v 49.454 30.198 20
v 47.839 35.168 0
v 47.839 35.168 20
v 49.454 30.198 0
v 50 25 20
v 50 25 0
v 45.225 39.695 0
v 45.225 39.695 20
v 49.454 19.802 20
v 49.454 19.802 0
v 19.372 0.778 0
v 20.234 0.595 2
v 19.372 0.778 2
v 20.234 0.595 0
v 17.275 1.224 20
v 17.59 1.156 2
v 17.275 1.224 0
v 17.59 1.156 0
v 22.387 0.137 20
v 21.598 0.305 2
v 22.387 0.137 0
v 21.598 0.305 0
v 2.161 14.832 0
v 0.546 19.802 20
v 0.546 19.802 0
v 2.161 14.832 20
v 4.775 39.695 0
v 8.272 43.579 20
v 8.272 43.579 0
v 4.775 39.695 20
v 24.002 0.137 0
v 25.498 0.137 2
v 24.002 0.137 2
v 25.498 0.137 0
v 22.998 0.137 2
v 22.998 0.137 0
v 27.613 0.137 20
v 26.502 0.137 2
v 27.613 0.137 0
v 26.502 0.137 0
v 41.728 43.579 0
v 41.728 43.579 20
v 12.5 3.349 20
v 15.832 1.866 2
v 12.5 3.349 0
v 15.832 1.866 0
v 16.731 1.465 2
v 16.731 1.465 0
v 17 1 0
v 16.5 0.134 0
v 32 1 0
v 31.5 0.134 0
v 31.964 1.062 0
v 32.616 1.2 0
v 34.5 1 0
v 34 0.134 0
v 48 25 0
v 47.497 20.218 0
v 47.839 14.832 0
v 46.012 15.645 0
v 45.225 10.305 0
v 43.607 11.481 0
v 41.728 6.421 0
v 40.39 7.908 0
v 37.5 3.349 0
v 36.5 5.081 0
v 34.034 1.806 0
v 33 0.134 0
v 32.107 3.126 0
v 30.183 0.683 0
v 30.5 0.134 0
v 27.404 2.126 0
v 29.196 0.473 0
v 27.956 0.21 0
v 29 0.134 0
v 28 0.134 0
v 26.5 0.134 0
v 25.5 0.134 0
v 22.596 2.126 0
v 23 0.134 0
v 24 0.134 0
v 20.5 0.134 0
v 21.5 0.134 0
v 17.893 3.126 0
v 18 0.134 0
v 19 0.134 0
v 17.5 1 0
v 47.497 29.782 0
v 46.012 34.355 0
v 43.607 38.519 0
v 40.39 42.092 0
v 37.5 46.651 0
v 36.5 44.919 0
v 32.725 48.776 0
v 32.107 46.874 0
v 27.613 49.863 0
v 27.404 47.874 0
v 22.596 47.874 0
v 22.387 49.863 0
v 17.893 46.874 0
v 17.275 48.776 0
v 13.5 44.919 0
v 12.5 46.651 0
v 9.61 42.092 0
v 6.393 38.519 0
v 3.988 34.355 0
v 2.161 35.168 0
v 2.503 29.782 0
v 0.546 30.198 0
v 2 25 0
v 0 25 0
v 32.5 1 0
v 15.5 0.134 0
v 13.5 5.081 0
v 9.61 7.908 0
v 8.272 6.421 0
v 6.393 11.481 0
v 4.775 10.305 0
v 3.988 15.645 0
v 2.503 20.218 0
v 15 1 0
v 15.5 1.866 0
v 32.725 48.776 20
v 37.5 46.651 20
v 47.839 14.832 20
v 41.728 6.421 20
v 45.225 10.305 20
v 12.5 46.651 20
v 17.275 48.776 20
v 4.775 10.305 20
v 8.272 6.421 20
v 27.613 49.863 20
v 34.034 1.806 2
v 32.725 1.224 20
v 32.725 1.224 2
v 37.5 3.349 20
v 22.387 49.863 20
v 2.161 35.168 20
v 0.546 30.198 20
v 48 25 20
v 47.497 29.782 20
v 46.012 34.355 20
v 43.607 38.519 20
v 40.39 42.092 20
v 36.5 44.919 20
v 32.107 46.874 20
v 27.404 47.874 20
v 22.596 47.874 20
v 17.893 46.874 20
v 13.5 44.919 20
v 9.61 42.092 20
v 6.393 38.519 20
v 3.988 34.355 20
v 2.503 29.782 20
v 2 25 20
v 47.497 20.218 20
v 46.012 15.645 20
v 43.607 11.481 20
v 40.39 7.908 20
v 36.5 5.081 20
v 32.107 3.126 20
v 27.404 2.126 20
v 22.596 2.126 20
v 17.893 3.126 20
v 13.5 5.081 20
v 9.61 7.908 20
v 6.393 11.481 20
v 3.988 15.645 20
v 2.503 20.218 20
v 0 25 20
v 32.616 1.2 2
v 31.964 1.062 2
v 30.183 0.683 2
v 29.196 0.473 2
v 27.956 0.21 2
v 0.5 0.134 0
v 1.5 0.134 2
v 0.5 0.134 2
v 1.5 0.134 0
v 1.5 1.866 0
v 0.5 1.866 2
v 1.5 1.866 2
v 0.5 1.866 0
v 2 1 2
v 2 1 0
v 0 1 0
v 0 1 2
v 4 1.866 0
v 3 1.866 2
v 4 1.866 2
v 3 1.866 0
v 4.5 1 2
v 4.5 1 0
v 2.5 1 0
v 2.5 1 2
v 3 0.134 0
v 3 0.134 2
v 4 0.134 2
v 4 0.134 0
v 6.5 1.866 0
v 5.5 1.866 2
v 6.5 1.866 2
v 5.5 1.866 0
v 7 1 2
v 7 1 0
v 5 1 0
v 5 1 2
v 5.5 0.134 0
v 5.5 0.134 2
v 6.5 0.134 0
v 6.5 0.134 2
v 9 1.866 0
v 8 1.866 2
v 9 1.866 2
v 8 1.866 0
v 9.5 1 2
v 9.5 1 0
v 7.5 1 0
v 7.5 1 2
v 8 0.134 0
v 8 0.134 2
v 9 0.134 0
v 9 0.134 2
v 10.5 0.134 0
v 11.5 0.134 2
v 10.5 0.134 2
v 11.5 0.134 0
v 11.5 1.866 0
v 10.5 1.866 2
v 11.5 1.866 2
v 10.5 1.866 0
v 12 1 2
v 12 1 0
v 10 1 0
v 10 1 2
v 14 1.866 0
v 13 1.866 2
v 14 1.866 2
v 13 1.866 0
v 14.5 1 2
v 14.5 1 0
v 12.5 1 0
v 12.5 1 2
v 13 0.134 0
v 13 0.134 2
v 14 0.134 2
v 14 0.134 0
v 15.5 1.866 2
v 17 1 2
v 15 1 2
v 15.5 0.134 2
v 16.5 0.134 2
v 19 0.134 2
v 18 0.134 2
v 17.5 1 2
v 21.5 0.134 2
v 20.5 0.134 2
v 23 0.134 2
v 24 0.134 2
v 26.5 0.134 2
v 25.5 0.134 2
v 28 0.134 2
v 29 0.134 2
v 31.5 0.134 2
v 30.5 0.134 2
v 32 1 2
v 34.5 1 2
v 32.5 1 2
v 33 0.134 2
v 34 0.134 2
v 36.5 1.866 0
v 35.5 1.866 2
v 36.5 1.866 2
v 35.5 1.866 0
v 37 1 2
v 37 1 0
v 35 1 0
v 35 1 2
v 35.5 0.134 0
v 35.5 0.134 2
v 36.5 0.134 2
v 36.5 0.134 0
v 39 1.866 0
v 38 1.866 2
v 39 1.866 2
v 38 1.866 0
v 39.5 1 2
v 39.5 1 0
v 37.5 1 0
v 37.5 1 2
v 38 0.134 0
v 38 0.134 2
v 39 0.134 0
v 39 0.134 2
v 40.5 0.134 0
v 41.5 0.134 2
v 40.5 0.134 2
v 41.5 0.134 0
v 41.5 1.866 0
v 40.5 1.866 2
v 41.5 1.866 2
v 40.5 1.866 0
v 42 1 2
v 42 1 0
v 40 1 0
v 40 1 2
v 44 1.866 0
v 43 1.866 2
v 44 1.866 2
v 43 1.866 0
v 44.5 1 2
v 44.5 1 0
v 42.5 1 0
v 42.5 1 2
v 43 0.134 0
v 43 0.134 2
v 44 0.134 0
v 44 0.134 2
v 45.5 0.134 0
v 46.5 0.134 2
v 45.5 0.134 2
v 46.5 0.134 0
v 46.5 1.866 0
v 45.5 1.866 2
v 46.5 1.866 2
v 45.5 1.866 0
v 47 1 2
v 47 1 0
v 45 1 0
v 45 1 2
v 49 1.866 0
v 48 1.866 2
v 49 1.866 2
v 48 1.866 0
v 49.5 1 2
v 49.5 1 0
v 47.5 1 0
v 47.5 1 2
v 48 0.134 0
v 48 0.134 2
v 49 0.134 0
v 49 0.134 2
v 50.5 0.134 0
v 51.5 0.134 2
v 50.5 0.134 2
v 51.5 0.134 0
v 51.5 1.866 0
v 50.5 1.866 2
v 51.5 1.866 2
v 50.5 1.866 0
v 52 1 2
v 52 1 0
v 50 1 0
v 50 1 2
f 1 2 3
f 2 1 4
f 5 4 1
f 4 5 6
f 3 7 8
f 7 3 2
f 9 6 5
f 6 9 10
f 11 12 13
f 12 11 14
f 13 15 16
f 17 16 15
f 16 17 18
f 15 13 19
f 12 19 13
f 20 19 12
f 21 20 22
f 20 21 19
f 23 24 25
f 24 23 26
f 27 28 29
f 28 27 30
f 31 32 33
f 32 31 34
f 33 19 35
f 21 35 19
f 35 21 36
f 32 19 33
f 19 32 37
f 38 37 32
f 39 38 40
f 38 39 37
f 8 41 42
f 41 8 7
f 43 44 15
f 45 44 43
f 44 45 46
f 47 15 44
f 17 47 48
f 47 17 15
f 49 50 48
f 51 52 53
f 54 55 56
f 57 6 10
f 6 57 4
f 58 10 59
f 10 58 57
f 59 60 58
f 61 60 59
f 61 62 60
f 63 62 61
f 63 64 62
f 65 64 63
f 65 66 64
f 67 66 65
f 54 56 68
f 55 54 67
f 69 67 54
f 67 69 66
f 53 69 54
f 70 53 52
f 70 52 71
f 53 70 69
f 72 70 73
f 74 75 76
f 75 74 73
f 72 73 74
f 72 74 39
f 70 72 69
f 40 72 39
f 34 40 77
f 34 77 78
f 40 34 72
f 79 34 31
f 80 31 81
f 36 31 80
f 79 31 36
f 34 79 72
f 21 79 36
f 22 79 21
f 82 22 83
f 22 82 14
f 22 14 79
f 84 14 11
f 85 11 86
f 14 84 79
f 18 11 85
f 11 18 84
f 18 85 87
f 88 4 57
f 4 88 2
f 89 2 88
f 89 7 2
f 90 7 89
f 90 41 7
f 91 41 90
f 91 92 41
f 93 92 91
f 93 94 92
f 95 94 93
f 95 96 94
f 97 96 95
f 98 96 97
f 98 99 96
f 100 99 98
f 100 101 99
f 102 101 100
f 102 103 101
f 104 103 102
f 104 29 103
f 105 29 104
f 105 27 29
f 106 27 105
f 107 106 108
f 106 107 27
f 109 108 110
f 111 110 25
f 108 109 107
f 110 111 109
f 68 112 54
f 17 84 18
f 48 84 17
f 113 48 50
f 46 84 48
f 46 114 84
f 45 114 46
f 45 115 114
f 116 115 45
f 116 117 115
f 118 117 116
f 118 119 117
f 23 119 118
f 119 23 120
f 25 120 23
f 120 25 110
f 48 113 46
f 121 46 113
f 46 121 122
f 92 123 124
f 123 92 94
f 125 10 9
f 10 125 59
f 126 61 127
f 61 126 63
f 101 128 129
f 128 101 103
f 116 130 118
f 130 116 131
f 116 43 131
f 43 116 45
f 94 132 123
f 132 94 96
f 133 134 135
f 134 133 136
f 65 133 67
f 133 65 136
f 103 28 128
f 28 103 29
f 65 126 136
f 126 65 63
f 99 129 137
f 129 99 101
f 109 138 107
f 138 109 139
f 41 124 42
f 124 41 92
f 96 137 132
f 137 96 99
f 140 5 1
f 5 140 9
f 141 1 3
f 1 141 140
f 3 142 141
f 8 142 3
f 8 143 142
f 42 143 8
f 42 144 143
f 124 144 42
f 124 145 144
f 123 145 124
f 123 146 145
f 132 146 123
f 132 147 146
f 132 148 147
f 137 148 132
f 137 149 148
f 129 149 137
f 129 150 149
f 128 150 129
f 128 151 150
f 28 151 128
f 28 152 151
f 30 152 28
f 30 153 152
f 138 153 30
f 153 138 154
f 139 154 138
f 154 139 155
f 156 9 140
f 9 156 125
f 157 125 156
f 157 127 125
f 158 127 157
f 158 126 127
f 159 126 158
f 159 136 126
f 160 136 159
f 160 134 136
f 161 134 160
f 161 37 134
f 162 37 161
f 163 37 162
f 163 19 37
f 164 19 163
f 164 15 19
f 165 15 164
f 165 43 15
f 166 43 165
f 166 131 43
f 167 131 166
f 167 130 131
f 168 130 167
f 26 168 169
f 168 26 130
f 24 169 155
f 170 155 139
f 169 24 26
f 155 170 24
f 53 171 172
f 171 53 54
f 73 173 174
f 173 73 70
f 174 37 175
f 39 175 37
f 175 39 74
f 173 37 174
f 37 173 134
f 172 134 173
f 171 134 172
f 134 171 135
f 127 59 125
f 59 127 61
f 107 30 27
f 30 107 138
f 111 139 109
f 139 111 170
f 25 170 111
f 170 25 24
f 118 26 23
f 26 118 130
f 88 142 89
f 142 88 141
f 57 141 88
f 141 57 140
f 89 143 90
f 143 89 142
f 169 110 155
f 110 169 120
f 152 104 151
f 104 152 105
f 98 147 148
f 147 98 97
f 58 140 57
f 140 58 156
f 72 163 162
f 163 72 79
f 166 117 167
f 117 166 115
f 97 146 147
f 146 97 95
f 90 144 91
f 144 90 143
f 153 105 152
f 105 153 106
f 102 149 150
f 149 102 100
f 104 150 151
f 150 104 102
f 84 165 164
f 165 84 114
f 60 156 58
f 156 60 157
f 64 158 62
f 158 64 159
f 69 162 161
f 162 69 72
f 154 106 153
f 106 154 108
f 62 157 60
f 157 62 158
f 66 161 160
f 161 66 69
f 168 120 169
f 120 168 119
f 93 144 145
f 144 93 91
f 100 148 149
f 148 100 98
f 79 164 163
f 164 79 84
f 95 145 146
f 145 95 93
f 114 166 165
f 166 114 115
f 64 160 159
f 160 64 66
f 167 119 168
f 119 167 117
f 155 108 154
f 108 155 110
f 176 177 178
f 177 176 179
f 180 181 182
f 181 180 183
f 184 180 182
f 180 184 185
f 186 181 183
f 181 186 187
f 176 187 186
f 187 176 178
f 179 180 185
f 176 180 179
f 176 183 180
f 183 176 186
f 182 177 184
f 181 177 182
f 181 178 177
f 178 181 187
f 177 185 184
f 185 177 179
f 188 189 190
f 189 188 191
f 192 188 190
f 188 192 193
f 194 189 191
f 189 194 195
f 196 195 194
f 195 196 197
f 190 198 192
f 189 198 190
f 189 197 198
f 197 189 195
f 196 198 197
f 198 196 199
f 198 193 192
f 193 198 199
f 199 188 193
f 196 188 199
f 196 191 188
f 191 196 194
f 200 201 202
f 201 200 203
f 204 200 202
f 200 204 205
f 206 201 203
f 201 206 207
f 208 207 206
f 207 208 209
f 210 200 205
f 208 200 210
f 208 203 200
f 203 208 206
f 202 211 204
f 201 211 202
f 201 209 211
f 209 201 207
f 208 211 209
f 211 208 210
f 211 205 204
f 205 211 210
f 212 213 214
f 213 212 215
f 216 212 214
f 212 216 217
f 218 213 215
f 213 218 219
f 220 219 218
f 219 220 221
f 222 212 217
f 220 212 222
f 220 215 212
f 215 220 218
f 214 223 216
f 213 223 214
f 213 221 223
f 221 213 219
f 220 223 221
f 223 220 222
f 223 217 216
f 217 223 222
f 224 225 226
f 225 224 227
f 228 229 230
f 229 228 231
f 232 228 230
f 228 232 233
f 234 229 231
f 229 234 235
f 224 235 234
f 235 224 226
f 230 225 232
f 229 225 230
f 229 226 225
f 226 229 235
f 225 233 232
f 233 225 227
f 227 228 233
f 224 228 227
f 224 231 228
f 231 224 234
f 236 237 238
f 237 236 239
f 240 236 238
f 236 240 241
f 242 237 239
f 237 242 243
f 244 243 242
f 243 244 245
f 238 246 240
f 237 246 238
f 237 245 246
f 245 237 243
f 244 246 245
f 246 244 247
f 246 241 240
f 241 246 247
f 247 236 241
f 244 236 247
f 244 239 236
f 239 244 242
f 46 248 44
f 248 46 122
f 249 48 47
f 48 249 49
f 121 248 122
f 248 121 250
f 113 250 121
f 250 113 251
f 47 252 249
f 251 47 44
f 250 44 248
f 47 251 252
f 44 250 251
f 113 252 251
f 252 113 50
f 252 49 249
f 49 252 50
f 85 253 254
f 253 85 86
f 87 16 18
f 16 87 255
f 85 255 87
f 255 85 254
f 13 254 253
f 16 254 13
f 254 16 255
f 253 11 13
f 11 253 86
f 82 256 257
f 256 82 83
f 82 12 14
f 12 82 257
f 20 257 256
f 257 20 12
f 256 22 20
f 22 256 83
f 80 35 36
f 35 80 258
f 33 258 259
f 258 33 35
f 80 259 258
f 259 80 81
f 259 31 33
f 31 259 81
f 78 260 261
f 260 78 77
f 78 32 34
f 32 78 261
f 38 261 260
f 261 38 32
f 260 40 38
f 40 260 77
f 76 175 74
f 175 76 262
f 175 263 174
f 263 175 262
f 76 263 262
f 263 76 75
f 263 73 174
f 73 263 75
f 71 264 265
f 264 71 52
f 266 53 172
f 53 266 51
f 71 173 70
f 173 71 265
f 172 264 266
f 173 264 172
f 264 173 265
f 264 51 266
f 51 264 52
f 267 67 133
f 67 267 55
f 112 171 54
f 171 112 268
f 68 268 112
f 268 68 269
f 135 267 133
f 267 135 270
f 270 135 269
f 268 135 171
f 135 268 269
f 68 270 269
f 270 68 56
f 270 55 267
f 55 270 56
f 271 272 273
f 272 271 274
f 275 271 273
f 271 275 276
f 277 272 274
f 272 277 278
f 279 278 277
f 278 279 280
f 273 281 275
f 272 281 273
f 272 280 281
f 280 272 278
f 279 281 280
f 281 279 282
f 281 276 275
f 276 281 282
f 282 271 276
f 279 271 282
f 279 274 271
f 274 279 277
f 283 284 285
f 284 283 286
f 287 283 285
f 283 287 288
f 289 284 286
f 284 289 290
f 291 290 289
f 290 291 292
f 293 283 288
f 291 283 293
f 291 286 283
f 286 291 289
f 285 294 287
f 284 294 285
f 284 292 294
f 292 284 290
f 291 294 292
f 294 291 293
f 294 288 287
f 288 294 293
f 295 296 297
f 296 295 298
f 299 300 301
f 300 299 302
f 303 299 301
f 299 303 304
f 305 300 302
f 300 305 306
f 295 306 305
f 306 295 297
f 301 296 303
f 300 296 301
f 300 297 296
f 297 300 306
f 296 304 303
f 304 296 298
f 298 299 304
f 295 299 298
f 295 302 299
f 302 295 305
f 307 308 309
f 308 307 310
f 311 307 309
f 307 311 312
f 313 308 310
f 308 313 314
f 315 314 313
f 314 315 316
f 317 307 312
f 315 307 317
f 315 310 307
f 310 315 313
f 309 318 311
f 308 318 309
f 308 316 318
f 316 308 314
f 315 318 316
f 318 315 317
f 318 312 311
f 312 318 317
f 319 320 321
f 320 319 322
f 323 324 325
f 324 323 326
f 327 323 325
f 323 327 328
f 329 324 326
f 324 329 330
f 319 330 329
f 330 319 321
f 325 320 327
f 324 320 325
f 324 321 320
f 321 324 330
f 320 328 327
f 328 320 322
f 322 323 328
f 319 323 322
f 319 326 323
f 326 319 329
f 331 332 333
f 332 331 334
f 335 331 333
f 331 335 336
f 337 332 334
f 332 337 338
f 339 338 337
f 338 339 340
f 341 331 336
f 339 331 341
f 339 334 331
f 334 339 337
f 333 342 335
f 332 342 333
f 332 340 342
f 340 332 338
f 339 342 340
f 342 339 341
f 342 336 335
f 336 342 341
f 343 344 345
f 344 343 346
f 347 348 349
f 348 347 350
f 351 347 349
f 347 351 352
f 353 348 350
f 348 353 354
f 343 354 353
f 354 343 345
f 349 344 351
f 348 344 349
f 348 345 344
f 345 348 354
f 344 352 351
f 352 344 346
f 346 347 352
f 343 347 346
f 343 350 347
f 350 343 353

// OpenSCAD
dim_hex=2;
hght_slice=2;
//
main_cylinder_h=20;
main_cylinder_d=50;
main_cylinder_wall=2;
//
// translate([main_cylinder_d/2,main_cylinder_d/2,0])
// cylinder(h=main_cylinder_h,d=main_cylinder_d);
//

difference() {
translate([main_cylinder_d/2,main_cylinder_d/2,0])
cylinder(h=main_cylinder_h,d=main_cylinder_d);

translate([main_cylinder_d/2,main_cylinder_d/2,0])
cylinder(h=main_cylinder_h,d=main_cylinder_d-(main_cylinder_wall*2));

}

//

for (i=[0:0.25:5])
   translate([i*10,0,0])
     translate([dim_hex/2,dim_hex/2,0])
        cylinder($fn=6, h=hght_slice, d=dim_hex);
